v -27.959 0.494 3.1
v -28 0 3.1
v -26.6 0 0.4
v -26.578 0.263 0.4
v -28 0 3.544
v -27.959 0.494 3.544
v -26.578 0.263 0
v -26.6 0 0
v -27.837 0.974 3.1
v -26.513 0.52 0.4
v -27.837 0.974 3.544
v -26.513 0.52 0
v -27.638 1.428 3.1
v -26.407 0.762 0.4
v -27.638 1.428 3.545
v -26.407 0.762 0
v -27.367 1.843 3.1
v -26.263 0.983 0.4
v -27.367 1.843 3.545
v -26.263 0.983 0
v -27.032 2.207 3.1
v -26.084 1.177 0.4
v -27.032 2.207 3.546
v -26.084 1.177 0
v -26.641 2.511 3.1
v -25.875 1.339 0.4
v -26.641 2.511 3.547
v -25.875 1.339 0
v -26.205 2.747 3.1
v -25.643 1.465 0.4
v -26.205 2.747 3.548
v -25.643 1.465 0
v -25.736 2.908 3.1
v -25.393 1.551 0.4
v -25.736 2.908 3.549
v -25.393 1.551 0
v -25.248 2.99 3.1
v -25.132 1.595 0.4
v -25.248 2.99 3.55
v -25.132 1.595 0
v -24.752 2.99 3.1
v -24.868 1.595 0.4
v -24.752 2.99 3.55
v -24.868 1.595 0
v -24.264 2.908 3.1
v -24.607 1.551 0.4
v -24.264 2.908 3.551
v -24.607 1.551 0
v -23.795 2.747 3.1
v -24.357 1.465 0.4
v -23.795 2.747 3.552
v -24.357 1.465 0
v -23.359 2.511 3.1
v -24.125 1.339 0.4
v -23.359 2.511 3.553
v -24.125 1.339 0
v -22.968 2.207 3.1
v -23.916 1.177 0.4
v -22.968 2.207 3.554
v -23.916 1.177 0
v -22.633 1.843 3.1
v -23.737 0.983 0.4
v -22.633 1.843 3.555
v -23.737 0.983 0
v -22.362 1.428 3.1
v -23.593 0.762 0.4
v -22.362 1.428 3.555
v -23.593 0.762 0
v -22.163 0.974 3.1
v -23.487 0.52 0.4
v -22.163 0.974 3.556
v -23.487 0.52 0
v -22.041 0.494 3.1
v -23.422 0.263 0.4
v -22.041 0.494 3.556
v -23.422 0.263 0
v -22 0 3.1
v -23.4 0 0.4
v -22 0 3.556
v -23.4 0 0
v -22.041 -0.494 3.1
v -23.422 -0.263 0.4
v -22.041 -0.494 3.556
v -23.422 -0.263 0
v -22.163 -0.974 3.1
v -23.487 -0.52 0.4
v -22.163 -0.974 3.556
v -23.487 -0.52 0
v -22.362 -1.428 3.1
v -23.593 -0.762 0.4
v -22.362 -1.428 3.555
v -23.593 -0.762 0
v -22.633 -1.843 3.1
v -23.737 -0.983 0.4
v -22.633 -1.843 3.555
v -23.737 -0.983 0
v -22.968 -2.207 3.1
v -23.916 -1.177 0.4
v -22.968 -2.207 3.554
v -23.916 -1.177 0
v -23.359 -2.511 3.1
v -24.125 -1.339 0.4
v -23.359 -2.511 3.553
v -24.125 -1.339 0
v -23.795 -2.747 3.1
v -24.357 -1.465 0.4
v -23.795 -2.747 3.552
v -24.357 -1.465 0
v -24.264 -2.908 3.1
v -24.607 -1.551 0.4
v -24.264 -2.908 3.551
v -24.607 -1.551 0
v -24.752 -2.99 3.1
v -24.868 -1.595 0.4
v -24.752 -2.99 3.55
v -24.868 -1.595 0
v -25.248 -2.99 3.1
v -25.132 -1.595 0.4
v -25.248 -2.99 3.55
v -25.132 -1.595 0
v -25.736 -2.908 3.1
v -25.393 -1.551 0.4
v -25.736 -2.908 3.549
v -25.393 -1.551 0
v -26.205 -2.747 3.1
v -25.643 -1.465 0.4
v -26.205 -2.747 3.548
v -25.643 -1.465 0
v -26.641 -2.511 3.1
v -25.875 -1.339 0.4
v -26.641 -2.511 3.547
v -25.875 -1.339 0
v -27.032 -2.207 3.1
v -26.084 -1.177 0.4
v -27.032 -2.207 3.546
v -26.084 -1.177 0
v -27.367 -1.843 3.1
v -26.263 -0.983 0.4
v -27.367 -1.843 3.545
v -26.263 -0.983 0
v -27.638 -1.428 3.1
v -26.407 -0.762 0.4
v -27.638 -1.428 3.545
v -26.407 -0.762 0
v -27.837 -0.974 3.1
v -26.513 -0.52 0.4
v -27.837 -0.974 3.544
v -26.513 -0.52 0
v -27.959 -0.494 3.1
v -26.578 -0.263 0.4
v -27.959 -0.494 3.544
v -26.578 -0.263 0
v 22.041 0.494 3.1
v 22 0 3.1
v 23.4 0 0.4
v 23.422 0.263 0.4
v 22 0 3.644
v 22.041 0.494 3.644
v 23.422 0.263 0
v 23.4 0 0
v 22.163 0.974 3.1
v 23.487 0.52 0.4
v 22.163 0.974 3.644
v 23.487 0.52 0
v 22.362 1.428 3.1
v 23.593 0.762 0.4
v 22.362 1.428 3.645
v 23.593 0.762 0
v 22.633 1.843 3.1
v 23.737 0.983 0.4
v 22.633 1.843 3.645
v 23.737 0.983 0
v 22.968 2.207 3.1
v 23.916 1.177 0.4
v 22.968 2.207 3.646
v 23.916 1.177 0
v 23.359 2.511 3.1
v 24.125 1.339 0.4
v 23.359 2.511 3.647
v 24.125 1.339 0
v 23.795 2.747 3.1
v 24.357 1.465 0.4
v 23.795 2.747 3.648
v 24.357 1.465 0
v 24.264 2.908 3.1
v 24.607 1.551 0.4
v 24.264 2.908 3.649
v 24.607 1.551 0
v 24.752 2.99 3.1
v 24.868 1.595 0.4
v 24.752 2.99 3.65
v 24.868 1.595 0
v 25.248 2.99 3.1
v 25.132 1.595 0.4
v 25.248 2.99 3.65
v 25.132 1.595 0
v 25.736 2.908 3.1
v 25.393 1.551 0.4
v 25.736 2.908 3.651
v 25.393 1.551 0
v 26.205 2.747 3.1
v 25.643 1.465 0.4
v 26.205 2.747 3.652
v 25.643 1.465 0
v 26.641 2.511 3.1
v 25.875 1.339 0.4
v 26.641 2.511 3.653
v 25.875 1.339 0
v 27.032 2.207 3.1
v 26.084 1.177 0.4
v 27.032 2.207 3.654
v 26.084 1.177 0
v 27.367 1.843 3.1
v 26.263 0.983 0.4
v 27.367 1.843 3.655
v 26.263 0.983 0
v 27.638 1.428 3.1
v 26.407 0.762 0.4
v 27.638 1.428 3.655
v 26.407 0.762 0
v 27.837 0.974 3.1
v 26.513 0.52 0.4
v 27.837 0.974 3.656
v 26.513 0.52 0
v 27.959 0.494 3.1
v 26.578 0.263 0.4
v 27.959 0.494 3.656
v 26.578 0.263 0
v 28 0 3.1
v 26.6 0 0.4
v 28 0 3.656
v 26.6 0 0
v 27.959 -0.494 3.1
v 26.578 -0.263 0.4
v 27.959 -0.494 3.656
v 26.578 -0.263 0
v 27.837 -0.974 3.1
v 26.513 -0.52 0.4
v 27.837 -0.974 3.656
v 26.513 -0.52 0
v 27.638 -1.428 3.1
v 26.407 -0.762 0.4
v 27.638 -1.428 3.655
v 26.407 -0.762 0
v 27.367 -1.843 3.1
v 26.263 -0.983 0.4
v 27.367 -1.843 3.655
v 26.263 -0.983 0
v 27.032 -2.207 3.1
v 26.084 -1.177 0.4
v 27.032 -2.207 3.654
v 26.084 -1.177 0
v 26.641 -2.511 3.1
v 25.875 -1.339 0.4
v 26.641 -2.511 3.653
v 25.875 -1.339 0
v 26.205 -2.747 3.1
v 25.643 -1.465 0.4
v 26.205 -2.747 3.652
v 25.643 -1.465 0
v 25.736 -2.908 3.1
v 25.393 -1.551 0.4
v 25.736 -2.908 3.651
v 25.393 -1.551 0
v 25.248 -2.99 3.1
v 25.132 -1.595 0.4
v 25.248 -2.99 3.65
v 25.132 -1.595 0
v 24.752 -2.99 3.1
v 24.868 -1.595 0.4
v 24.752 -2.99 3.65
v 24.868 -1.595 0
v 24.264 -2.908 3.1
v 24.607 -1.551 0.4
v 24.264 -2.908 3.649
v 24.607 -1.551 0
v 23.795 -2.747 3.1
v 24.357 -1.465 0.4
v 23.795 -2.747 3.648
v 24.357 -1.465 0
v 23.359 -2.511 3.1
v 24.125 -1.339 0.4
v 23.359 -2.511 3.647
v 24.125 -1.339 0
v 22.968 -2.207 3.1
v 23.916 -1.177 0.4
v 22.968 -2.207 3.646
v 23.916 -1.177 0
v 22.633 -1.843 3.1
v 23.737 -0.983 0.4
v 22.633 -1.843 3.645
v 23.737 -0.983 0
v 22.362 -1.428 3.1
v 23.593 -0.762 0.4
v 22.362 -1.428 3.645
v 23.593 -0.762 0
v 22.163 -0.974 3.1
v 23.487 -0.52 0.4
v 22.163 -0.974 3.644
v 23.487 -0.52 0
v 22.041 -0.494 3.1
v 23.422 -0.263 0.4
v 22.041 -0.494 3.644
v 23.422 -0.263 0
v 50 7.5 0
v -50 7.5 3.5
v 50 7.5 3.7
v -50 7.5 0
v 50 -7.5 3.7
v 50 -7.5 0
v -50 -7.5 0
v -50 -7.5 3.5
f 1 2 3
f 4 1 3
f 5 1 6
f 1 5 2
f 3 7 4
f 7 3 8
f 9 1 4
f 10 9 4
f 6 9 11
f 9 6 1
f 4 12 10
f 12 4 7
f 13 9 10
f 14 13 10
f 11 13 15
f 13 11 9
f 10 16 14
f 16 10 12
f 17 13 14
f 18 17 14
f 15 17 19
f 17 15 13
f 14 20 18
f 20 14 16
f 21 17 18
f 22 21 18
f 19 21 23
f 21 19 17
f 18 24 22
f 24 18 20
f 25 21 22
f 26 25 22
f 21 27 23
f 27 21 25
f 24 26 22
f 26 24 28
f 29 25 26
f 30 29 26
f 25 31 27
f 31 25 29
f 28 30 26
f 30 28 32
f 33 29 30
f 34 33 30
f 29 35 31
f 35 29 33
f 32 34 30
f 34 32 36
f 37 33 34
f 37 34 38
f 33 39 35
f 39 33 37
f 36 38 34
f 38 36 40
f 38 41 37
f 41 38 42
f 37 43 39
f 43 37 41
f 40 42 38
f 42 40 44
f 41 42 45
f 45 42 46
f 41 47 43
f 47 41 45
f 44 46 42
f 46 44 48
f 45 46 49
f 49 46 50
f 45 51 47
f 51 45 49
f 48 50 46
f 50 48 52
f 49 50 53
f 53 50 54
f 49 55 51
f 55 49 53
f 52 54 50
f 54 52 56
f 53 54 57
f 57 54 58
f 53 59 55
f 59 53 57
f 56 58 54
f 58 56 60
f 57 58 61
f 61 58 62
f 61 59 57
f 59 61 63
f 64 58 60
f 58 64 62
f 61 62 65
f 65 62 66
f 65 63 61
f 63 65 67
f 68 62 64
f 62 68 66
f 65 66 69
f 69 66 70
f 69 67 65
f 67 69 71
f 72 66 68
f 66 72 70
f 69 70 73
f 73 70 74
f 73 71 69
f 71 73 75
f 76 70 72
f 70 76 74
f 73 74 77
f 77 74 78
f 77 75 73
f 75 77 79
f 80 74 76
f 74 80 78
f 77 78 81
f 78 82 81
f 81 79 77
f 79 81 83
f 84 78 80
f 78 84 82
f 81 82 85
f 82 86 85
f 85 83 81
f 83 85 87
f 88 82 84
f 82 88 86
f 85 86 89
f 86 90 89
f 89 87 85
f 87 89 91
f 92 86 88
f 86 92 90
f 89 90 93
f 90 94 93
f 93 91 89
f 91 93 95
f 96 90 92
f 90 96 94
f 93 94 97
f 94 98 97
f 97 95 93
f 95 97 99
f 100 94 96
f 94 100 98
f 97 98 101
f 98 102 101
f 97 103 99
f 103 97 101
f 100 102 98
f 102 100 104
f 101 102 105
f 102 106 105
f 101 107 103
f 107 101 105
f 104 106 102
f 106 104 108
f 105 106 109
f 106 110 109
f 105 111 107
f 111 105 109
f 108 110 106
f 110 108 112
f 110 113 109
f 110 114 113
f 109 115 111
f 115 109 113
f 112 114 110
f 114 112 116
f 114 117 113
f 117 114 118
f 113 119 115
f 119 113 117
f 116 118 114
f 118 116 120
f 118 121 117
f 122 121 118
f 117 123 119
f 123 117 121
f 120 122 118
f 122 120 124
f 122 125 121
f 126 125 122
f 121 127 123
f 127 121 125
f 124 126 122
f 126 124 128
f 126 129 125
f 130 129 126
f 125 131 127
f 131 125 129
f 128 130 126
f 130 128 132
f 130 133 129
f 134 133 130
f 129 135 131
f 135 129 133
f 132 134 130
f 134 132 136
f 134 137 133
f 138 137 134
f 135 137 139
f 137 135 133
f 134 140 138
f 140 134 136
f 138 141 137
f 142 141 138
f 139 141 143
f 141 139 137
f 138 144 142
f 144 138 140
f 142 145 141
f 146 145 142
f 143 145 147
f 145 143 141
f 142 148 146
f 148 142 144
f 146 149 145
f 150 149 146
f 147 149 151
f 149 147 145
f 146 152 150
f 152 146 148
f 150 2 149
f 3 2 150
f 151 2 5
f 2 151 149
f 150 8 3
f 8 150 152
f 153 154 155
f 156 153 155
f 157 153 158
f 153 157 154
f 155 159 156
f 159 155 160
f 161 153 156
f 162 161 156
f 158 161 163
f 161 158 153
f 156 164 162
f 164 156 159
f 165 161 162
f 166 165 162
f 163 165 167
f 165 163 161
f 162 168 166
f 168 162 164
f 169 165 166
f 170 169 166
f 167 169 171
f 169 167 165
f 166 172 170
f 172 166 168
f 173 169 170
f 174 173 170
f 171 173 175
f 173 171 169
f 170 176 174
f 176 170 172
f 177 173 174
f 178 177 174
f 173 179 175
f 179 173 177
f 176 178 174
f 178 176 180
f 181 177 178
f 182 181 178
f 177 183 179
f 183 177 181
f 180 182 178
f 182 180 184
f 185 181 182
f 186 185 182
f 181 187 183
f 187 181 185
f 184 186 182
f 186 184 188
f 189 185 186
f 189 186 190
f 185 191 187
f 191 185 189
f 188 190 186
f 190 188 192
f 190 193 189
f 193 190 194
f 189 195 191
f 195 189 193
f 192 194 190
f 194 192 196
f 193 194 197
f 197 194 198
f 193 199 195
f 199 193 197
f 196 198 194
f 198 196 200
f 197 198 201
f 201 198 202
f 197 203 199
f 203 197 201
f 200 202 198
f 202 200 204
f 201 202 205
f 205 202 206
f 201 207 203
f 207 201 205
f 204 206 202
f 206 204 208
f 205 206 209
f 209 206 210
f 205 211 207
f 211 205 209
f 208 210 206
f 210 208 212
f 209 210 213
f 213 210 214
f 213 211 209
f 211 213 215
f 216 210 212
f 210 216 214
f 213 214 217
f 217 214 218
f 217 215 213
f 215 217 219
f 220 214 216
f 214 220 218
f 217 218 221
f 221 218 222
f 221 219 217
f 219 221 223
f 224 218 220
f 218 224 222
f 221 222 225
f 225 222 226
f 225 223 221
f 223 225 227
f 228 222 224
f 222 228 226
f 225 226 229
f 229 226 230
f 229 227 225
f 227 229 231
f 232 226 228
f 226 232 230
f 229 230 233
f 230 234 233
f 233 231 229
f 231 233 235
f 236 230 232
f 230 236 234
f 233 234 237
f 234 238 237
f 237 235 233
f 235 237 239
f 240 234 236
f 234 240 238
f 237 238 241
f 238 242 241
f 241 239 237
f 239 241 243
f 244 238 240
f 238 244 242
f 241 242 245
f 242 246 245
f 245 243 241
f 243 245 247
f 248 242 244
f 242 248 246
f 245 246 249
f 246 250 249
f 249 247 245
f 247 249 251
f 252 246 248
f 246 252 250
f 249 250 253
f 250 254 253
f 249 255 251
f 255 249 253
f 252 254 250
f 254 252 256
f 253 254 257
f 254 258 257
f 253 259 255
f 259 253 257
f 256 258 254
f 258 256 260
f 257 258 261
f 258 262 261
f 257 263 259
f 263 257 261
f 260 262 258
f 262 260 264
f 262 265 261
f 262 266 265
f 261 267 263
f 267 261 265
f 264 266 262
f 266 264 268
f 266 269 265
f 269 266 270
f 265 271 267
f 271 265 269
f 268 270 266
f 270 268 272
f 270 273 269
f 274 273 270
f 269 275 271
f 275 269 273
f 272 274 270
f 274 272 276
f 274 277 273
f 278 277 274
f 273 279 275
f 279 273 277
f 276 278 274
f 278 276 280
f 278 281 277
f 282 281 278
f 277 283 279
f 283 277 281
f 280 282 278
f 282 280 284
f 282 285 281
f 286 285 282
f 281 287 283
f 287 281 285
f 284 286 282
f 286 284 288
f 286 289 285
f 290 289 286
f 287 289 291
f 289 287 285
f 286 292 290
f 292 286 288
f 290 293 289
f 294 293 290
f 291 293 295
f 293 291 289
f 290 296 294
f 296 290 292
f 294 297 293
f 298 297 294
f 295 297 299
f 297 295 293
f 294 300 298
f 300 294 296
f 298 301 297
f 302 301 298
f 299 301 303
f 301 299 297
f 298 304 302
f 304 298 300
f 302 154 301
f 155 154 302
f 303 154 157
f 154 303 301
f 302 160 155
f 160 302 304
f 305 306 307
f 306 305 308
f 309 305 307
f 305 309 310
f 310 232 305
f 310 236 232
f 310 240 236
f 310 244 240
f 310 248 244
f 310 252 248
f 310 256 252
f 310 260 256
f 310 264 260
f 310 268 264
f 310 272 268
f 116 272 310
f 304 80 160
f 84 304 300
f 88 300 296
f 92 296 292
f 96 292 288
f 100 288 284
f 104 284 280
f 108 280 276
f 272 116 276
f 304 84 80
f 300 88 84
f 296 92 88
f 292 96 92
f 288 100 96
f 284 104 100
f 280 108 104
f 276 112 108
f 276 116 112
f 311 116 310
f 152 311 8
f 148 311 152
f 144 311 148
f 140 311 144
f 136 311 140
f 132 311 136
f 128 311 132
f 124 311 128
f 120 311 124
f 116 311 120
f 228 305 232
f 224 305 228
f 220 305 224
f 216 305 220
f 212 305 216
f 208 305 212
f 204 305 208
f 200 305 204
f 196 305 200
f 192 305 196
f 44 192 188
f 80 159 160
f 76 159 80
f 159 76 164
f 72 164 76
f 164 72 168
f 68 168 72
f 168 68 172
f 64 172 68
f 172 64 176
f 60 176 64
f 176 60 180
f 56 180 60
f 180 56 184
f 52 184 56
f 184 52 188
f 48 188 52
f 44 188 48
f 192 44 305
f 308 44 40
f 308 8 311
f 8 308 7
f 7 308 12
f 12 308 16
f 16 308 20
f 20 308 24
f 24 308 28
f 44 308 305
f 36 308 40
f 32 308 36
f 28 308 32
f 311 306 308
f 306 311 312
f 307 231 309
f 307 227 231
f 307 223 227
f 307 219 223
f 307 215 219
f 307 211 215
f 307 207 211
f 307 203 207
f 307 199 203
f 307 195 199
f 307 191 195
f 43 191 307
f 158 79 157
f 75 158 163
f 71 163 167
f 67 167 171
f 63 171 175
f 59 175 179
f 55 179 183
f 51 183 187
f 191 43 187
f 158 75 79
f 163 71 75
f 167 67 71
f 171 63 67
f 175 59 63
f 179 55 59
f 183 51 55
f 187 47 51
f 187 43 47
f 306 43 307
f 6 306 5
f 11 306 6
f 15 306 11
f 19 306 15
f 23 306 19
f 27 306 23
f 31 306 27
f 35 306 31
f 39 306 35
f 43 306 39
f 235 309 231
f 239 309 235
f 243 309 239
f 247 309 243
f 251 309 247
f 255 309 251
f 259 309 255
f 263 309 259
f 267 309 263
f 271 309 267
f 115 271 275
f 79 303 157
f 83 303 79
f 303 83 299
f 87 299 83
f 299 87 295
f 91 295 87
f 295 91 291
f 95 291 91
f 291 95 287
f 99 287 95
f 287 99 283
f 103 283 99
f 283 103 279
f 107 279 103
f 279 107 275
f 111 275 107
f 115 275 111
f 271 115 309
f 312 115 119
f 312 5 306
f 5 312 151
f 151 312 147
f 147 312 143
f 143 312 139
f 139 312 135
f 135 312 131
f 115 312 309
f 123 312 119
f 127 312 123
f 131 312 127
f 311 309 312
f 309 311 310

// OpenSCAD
/**
 * @license GPLv3 License
 * Copyright (c) 2023 Jean-Sebastien CONAN
 *
 * A wedge for aligning a door with its frame.
 *
 * Requires OpenSCAD for rendering the model, see https://openscad.org/
 */

// Defines the constraints for the object.
width = 100;            // overall width of the wedge
height = 15;            // overall height of the wedge
thicknessLeft = 3.5;    // thickness of the left side
thicknessRight = 3.7;   // thickness of the right side
screwDiameter = 3.2;    // outer diameter for the screw lead
screwHeadDiameter = 6;  // outer diameter for the screw head
screwHeadHeight = 2.7;  // the height of the screw head, from the top to the neck
screwHeadOffset = .6;   // the height of the screw head before the bevel
screws = 2;             // number of screws on the wedge

// Sets the rendering accuracy
$fa = .5;
$fs = .5;

// Defines an offset to avoid having a residual layer on difference
differenceAlignment = .1;

// Refines the  sizes
screwInterval = width / screws;
screwStart = -screwInterval * (screws - 1) / 2;
halfWidth = width / 2;
thickness = max(thicknessLeft, thicknessRight);
screwHeight = thickness - (screwHeadHeight + screwHeadOffset);
halfScrewDiameter = screwDiameter / 2;
halfScrewHeadDiameter = screwHeadDiameter / 2;

// Builds the wedge
difference() {
    // Wedge body
    rotate([90, 0, 0]) {
        linear_extrude(height = height, center = true, convexity = 10) {
            polygon(points = [
                [-halfWidth, 0],
                [halfWidth, 0],
                [halfWidth, thicknessRight],
                [-halfWidth, thicknessLeft],
            ]);
        }
    }

    // Screw holes
    for (i = [0 : max(0, screws - 1)]) {
        translate([screwStart + screwInterval * i, 0, 0]) {
            rotate_extrude(angle = 360, convexity = 10) {
                polygon(points=[
                    // Difference offset for making the object manifold
                    [0, -differenceAlignment],
                    [halfScrewDiameter, -differenceAlignment],

                    // Screw profile
                    [halfScrewDiameter, 0],
                    [halfScrewDiameter, screwHeight],
                    [halfScrewHeadDiameter, thickness - screwHeadOffset],
                    [halfScrewHeadDiameter, thickness],

                    // Difference offset for making the object manifold
                    [halfScrewHeadDiameter, thickness + differenceAlignment],
                    [0, thickness + differenceAlignment],
                ]);
            }
        }
    }
}
